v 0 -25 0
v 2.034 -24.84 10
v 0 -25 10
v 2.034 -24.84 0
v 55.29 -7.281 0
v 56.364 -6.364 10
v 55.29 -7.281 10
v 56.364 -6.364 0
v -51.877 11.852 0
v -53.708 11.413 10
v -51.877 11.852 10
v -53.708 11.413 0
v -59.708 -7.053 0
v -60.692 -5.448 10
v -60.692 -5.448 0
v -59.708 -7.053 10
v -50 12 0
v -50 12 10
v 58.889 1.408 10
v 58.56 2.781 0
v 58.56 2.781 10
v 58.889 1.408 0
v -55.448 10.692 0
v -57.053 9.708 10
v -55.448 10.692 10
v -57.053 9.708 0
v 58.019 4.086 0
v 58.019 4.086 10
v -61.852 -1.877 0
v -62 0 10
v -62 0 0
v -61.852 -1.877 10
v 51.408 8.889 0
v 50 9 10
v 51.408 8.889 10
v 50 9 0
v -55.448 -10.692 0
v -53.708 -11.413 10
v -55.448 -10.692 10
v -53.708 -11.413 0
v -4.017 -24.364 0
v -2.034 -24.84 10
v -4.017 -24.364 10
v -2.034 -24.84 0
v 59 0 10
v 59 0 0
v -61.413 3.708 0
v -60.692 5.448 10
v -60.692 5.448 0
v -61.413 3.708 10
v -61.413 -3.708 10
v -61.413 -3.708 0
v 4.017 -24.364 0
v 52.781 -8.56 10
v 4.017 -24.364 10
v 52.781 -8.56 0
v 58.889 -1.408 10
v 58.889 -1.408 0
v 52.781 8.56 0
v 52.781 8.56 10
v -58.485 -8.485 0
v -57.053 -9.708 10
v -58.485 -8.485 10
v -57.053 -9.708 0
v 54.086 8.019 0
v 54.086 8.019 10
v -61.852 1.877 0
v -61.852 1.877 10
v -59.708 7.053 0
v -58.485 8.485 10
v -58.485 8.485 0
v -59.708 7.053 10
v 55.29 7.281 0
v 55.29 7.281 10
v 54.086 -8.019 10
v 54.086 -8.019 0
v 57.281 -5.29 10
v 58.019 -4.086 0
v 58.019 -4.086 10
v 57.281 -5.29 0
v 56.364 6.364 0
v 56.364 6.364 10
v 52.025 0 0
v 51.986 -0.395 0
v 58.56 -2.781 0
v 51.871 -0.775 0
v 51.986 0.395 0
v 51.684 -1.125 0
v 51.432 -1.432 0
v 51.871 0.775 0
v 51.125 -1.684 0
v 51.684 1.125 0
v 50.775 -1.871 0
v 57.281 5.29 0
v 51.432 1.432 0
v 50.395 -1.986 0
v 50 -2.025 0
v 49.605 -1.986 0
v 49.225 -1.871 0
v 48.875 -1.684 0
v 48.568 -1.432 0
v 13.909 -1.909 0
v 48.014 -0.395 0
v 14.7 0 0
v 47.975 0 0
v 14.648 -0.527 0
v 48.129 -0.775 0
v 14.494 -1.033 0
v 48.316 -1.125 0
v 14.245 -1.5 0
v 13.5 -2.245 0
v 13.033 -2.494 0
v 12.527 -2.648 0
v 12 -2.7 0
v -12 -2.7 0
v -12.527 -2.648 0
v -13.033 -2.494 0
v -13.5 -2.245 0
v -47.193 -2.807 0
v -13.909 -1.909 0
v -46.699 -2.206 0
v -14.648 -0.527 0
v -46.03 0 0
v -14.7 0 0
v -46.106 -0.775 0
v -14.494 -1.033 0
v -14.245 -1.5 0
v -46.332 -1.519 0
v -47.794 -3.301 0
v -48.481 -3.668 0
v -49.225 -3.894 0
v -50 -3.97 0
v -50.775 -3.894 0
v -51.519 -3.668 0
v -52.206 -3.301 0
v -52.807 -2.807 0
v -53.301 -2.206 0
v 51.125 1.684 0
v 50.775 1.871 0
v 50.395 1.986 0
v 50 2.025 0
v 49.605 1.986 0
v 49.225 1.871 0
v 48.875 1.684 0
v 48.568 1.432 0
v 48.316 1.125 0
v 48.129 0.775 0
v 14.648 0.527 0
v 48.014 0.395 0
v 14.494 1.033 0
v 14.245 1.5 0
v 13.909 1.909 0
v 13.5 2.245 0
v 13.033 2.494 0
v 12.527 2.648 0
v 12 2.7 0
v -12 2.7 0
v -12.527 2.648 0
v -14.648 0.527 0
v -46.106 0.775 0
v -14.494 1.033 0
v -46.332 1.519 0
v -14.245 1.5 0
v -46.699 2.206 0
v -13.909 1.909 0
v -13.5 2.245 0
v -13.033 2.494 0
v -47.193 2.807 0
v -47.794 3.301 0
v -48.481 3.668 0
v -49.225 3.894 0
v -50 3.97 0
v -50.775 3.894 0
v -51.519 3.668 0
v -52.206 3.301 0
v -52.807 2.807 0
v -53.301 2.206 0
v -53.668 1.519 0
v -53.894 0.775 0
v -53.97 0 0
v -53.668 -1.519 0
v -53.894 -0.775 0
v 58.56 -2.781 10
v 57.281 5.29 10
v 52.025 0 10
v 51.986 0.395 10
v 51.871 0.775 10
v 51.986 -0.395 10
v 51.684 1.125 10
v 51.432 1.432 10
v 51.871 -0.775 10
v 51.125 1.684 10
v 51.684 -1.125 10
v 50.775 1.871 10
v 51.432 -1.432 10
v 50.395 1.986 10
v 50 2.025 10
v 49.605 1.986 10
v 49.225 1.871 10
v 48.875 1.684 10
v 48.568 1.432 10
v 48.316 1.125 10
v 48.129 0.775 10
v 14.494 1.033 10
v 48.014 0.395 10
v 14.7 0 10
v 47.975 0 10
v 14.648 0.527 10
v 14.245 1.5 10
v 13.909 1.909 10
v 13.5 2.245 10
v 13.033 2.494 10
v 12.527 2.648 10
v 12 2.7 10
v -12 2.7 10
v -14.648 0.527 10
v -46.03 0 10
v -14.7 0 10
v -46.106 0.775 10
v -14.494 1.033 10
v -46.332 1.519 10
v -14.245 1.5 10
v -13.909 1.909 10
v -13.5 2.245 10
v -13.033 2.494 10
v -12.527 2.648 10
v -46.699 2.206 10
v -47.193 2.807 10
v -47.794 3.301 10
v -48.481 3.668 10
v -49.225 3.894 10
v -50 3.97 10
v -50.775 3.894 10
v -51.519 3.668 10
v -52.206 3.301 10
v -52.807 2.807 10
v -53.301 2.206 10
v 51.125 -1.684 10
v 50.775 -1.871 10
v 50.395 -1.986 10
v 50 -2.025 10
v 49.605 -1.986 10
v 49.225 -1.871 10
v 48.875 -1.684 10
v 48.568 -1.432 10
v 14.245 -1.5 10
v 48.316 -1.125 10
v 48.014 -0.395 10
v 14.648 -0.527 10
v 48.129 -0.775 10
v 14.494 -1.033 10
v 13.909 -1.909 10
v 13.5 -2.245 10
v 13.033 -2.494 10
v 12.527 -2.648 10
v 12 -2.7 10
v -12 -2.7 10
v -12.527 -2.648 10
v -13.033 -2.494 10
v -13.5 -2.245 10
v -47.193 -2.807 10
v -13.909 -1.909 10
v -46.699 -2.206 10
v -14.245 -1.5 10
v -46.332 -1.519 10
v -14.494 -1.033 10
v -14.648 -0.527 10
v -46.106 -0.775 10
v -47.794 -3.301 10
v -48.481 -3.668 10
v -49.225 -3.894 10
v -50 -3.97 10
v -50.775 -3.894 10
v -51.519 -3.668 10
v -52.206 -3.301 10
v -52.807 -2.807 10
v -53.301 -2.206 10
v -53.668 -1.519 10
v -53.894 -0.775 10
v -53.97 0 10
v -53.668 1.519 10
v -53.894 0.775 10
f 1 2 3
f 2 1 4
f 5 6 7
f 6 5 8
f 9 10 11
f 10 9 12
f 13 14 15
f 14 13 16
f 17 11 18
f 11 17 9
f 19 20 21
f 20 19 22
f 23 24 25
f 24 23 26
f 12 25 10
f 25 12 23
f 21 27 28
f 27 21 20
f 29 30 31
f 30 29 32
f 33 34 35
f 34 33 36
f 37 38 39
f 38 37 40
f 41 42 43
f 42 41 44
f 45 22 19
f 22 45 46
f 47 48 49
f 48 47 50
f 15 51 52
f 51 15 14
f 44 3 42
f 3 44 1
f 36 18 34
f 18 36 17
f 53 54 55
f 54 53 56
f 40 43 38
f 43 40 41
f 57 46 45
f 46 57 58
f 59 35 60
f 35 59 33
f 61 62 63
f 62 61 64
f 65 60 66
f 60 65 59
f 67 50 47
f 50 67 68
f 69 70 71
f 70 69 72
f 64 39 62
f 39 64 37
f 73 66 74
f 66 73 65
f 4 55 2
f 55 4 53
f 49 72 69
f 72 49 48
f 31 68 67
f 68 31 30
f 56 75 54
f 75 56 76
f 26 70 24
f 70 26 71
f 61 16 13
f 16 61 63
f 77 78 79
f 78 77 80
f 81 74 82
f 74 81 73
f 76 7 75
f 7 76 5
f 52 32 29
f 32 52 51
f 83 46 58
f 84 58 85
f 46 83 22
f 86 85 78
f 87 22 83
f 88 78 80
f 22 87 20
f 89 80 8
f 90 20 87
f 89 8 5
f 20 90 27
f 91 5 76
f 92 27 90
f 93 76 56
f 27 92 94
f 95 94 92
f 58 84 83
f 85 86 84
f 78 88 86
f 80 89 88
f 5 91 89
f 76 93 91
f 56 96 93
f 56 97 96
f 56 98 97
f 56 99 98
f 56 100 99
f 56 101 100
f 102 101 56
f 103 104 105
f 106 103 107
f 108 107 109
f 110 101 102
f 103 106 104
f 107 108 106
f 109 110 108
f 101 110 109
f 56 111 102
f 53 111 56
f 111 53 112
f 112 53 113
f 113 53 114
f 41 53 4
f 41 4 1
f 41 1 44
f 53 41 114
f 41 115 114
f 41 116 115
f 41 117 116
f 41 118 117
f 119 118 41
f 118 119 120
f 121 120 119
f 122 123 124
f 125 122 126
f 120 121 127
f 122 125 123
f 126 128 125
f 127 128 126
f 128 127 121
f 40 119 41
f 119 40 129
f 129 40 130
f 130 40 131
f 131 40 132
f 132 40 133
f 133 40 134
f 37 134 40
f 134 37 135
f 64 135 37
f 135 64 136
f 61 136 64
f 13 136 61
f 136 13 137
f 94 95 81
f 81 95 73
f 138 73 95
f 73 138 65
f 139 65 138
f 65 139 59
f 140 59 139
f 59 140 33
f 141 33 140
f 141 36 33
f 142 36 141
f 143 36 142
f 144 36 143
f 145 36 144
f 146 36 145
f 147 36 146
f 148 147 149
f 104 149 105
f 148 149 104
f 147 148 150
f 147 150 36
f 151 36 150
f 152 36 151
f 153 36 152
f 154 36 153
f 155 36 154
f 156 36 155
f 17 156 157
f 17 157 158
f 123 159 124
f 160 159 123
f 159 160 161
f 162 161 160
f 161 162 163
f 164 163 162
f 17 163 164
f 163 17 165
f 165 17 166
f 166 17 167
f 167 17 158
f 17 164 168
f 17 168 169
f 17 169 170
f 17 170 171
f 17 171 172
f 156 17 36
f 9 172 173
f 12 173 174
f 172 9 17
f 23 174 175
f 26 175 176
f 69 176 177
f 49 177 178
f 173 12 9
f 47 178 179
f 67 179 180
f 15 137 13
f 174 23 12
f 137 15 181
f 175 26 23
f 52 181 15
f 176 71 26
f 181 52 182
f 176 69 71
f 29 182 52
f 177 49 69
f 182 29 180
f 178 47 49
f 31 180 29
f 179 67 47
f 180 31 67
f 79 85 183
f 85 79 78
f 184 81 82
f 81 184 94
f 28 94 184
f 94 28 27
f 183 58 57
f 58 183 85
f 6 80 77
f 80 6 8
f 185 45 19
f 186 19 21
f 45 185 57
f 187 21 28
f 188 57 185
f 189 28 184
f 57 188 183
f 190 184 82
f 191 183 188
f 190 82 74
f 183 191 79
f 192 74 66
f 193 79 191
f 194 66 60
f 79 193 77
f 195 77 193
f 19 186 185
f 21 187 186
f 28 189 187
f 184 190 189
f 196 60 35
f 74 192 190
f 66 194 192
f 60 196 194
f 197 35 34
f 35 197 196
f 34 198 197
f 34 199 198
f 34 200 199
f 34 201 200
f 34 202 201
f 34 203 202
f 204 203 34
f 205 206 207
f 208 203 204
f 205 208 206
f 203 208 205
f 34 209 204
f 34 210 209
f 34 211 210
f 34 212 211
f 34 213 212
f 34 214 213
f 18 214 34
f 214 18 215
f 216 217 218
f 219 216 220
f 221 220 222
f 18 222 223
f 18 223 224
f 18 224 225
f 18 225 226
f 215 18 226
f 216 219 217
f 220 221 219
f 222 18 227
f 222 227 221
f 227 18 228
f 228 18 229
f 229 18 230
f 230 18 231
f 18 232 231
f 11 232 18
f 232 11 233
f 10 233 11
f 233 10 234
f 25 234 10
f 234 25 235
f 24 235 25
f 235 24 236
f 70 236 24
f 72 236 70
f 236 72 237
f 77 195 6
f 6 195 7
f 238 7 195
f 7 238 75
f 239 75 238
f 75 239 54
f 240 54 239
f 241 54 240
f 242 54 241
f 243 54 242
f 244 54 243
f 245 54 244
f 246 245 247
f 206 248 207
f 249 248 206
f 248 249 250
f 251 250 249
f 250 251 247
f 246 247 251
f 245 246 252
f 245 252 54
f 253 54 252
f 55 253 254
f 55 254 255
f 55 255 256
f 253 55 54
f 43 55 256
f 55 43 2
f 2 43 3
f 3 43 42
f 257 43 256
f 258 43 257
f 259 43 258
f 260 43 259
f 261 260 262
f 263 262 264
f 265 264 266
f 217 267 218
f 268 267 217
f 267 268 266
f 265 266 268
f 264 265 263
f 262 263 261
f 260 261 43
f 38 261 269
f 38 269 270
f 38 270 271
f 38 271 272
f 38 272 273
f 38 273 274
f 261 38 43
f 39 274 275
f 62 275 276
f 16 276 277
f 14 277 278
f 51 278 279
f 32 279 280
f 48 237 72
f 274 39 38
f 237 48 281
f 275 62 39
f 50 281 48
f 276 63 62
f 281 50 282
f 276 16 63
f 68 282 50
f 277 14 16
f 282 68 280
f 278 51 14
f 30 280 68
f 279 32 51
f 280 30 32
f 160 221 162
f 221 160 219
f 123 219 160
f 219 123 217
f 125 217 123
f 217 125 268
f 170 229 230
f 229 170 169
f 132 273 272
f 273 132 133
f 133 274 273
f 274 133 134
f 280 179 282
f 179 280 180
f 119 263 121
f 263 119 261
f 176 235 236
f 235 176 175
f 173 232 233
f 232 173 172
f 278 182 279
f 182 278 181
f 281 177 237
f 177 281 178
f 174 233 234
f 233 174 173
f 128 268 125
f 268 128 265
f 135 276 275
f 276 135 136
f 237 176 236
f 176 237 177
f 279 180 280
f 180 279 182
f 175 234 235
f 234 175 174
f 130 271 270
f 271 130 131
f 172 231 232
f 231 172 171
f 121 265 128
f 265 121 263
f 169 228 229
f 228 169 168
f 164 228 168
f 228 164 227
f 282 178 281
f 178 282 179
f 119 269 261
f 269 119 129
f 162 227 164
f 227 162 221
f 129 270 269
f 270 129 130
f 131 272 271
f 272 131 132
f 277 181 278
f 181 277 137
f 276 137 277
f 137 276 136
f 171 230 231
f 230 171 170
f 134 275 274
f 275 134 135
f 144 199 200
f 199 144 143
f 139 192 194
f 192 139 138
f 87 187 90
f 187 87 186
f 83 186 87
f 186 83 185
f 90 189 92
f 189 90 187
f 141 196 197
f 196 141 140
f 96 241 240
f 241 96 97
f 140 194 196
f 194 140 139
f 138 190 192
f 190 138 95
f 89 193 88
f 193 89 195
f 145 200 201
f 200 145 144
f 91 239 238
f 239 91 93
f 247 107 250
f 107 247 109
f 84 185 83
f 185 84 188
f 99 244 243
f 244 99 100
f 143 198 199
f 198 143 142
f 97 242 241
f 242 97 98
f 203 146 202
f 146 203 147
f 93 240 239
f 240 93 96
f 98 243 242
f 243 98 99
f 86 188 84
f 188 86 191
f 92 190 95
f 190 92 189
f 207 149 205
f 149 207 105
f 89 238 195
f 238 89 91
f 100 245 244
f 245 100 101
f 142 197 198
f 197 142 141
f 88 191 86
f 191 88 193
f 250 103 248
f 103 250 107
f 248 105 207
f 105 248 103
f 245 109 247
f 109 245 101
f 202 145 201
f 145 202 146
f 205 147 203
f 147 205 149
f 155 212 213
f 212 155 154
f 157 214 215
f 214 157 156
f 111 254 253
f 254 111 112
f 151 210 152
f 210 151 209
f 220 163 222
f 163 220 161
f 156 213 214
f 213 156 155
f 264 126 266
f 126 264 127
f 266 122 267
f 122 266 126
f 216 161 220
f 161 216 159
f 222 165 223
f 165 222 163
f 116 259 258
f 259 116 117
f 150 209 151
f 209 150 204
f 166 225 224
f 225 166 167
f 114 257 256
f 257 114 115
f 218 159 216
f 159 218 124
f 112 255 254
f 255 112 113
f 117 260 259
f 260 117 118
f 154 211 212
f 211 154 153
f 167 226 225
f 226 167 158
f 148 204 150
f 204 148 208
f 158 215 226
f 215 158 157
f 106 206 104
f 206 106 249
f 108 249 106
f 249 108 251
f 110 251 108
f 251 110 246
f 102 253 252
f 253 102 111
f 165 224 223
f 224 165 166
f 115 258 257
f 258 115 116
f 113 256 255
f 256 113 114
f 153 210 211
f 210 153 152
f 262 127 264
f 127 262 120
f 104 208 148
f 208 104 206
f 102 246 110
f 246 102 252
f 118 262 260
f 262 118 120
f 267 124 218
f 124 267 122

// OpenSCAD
$fn = 32;

// ----------------------------------------------------------------------
// Lever: 100 mm between the bosses, 10 mm thick, smooth outline
// ----------------------------------------------------------------------

// --- parameters (mm) ---
lever_l = 100;            // distance between the boss centres
boss_a = 24;              // first boss diameter
boss_b = 18;              // second boss diameter
bore_a = 7.94;            // first bore
bore_b = 4.05;            // second bore
lever_t = 10;             // lever thickness
boss_c = 26;              // middle boss diameter
bend = 12;                // how far the middle boss drops
slot_w = 5.4;             // adjustment slot width

lever_profile = [[-62, 0], [-61.852, -1.877], [-61.413, -3.708], [-60.692, -5.448], [-59.708, -7.053], [-58.485, -8.485], [-57.053, -9.708], [-55.448, -10.692], [-53.708, -11.413], [-4.017, -24.364], [-2.034, -24.84], [0, -25], [2.034, -24.84], [4.017, -24.364], [52.781, -8.56], [54.086, -8.019], [55.29, -7.281], [56.364, -6.364], [57.281, -5.29], [58.019, -4.086], [58.56, -2.781], [58.889, -1.408], [59, 0], [58.889, 1.408], [58.56, 2.781], [58.019, 4.086], [57.281, 5.29], [56.364, 6.364], [55.29, 7.281], [54.086, 8.019], [52.781, 8.56], [51.408, 8.889], [50, 9], [-50, 12], [-51.877, 11.852], [-53.708, 11.413], [-55.448, 10.692], [-57.053, 9.708], [-58.485, 8.485], [-59.708, 7.053], [-60.692, 5.448], [-61.413, 3.708], [-61.852, 1.877]];

difference() {
  linear_extrude(height = lever_t) polygon(lever_profile);
  translate([-50, 0, -2.5]) cylinder(h = lever_t + 5, d = bore_a);
  translate([50, 0, -2.5]) cylinder(h = lever_t + 5, d = bore_b);
  /* slotted adjustment, stadium shaped */
  hull() {
    translate([-12, 0, -2.5]) cylinder(h = lever_t + 5, d = slot_w);
    translate([12, 0, -2.5]) cylinder(h = lever_t + 5, d = slot_w);
  }
}
